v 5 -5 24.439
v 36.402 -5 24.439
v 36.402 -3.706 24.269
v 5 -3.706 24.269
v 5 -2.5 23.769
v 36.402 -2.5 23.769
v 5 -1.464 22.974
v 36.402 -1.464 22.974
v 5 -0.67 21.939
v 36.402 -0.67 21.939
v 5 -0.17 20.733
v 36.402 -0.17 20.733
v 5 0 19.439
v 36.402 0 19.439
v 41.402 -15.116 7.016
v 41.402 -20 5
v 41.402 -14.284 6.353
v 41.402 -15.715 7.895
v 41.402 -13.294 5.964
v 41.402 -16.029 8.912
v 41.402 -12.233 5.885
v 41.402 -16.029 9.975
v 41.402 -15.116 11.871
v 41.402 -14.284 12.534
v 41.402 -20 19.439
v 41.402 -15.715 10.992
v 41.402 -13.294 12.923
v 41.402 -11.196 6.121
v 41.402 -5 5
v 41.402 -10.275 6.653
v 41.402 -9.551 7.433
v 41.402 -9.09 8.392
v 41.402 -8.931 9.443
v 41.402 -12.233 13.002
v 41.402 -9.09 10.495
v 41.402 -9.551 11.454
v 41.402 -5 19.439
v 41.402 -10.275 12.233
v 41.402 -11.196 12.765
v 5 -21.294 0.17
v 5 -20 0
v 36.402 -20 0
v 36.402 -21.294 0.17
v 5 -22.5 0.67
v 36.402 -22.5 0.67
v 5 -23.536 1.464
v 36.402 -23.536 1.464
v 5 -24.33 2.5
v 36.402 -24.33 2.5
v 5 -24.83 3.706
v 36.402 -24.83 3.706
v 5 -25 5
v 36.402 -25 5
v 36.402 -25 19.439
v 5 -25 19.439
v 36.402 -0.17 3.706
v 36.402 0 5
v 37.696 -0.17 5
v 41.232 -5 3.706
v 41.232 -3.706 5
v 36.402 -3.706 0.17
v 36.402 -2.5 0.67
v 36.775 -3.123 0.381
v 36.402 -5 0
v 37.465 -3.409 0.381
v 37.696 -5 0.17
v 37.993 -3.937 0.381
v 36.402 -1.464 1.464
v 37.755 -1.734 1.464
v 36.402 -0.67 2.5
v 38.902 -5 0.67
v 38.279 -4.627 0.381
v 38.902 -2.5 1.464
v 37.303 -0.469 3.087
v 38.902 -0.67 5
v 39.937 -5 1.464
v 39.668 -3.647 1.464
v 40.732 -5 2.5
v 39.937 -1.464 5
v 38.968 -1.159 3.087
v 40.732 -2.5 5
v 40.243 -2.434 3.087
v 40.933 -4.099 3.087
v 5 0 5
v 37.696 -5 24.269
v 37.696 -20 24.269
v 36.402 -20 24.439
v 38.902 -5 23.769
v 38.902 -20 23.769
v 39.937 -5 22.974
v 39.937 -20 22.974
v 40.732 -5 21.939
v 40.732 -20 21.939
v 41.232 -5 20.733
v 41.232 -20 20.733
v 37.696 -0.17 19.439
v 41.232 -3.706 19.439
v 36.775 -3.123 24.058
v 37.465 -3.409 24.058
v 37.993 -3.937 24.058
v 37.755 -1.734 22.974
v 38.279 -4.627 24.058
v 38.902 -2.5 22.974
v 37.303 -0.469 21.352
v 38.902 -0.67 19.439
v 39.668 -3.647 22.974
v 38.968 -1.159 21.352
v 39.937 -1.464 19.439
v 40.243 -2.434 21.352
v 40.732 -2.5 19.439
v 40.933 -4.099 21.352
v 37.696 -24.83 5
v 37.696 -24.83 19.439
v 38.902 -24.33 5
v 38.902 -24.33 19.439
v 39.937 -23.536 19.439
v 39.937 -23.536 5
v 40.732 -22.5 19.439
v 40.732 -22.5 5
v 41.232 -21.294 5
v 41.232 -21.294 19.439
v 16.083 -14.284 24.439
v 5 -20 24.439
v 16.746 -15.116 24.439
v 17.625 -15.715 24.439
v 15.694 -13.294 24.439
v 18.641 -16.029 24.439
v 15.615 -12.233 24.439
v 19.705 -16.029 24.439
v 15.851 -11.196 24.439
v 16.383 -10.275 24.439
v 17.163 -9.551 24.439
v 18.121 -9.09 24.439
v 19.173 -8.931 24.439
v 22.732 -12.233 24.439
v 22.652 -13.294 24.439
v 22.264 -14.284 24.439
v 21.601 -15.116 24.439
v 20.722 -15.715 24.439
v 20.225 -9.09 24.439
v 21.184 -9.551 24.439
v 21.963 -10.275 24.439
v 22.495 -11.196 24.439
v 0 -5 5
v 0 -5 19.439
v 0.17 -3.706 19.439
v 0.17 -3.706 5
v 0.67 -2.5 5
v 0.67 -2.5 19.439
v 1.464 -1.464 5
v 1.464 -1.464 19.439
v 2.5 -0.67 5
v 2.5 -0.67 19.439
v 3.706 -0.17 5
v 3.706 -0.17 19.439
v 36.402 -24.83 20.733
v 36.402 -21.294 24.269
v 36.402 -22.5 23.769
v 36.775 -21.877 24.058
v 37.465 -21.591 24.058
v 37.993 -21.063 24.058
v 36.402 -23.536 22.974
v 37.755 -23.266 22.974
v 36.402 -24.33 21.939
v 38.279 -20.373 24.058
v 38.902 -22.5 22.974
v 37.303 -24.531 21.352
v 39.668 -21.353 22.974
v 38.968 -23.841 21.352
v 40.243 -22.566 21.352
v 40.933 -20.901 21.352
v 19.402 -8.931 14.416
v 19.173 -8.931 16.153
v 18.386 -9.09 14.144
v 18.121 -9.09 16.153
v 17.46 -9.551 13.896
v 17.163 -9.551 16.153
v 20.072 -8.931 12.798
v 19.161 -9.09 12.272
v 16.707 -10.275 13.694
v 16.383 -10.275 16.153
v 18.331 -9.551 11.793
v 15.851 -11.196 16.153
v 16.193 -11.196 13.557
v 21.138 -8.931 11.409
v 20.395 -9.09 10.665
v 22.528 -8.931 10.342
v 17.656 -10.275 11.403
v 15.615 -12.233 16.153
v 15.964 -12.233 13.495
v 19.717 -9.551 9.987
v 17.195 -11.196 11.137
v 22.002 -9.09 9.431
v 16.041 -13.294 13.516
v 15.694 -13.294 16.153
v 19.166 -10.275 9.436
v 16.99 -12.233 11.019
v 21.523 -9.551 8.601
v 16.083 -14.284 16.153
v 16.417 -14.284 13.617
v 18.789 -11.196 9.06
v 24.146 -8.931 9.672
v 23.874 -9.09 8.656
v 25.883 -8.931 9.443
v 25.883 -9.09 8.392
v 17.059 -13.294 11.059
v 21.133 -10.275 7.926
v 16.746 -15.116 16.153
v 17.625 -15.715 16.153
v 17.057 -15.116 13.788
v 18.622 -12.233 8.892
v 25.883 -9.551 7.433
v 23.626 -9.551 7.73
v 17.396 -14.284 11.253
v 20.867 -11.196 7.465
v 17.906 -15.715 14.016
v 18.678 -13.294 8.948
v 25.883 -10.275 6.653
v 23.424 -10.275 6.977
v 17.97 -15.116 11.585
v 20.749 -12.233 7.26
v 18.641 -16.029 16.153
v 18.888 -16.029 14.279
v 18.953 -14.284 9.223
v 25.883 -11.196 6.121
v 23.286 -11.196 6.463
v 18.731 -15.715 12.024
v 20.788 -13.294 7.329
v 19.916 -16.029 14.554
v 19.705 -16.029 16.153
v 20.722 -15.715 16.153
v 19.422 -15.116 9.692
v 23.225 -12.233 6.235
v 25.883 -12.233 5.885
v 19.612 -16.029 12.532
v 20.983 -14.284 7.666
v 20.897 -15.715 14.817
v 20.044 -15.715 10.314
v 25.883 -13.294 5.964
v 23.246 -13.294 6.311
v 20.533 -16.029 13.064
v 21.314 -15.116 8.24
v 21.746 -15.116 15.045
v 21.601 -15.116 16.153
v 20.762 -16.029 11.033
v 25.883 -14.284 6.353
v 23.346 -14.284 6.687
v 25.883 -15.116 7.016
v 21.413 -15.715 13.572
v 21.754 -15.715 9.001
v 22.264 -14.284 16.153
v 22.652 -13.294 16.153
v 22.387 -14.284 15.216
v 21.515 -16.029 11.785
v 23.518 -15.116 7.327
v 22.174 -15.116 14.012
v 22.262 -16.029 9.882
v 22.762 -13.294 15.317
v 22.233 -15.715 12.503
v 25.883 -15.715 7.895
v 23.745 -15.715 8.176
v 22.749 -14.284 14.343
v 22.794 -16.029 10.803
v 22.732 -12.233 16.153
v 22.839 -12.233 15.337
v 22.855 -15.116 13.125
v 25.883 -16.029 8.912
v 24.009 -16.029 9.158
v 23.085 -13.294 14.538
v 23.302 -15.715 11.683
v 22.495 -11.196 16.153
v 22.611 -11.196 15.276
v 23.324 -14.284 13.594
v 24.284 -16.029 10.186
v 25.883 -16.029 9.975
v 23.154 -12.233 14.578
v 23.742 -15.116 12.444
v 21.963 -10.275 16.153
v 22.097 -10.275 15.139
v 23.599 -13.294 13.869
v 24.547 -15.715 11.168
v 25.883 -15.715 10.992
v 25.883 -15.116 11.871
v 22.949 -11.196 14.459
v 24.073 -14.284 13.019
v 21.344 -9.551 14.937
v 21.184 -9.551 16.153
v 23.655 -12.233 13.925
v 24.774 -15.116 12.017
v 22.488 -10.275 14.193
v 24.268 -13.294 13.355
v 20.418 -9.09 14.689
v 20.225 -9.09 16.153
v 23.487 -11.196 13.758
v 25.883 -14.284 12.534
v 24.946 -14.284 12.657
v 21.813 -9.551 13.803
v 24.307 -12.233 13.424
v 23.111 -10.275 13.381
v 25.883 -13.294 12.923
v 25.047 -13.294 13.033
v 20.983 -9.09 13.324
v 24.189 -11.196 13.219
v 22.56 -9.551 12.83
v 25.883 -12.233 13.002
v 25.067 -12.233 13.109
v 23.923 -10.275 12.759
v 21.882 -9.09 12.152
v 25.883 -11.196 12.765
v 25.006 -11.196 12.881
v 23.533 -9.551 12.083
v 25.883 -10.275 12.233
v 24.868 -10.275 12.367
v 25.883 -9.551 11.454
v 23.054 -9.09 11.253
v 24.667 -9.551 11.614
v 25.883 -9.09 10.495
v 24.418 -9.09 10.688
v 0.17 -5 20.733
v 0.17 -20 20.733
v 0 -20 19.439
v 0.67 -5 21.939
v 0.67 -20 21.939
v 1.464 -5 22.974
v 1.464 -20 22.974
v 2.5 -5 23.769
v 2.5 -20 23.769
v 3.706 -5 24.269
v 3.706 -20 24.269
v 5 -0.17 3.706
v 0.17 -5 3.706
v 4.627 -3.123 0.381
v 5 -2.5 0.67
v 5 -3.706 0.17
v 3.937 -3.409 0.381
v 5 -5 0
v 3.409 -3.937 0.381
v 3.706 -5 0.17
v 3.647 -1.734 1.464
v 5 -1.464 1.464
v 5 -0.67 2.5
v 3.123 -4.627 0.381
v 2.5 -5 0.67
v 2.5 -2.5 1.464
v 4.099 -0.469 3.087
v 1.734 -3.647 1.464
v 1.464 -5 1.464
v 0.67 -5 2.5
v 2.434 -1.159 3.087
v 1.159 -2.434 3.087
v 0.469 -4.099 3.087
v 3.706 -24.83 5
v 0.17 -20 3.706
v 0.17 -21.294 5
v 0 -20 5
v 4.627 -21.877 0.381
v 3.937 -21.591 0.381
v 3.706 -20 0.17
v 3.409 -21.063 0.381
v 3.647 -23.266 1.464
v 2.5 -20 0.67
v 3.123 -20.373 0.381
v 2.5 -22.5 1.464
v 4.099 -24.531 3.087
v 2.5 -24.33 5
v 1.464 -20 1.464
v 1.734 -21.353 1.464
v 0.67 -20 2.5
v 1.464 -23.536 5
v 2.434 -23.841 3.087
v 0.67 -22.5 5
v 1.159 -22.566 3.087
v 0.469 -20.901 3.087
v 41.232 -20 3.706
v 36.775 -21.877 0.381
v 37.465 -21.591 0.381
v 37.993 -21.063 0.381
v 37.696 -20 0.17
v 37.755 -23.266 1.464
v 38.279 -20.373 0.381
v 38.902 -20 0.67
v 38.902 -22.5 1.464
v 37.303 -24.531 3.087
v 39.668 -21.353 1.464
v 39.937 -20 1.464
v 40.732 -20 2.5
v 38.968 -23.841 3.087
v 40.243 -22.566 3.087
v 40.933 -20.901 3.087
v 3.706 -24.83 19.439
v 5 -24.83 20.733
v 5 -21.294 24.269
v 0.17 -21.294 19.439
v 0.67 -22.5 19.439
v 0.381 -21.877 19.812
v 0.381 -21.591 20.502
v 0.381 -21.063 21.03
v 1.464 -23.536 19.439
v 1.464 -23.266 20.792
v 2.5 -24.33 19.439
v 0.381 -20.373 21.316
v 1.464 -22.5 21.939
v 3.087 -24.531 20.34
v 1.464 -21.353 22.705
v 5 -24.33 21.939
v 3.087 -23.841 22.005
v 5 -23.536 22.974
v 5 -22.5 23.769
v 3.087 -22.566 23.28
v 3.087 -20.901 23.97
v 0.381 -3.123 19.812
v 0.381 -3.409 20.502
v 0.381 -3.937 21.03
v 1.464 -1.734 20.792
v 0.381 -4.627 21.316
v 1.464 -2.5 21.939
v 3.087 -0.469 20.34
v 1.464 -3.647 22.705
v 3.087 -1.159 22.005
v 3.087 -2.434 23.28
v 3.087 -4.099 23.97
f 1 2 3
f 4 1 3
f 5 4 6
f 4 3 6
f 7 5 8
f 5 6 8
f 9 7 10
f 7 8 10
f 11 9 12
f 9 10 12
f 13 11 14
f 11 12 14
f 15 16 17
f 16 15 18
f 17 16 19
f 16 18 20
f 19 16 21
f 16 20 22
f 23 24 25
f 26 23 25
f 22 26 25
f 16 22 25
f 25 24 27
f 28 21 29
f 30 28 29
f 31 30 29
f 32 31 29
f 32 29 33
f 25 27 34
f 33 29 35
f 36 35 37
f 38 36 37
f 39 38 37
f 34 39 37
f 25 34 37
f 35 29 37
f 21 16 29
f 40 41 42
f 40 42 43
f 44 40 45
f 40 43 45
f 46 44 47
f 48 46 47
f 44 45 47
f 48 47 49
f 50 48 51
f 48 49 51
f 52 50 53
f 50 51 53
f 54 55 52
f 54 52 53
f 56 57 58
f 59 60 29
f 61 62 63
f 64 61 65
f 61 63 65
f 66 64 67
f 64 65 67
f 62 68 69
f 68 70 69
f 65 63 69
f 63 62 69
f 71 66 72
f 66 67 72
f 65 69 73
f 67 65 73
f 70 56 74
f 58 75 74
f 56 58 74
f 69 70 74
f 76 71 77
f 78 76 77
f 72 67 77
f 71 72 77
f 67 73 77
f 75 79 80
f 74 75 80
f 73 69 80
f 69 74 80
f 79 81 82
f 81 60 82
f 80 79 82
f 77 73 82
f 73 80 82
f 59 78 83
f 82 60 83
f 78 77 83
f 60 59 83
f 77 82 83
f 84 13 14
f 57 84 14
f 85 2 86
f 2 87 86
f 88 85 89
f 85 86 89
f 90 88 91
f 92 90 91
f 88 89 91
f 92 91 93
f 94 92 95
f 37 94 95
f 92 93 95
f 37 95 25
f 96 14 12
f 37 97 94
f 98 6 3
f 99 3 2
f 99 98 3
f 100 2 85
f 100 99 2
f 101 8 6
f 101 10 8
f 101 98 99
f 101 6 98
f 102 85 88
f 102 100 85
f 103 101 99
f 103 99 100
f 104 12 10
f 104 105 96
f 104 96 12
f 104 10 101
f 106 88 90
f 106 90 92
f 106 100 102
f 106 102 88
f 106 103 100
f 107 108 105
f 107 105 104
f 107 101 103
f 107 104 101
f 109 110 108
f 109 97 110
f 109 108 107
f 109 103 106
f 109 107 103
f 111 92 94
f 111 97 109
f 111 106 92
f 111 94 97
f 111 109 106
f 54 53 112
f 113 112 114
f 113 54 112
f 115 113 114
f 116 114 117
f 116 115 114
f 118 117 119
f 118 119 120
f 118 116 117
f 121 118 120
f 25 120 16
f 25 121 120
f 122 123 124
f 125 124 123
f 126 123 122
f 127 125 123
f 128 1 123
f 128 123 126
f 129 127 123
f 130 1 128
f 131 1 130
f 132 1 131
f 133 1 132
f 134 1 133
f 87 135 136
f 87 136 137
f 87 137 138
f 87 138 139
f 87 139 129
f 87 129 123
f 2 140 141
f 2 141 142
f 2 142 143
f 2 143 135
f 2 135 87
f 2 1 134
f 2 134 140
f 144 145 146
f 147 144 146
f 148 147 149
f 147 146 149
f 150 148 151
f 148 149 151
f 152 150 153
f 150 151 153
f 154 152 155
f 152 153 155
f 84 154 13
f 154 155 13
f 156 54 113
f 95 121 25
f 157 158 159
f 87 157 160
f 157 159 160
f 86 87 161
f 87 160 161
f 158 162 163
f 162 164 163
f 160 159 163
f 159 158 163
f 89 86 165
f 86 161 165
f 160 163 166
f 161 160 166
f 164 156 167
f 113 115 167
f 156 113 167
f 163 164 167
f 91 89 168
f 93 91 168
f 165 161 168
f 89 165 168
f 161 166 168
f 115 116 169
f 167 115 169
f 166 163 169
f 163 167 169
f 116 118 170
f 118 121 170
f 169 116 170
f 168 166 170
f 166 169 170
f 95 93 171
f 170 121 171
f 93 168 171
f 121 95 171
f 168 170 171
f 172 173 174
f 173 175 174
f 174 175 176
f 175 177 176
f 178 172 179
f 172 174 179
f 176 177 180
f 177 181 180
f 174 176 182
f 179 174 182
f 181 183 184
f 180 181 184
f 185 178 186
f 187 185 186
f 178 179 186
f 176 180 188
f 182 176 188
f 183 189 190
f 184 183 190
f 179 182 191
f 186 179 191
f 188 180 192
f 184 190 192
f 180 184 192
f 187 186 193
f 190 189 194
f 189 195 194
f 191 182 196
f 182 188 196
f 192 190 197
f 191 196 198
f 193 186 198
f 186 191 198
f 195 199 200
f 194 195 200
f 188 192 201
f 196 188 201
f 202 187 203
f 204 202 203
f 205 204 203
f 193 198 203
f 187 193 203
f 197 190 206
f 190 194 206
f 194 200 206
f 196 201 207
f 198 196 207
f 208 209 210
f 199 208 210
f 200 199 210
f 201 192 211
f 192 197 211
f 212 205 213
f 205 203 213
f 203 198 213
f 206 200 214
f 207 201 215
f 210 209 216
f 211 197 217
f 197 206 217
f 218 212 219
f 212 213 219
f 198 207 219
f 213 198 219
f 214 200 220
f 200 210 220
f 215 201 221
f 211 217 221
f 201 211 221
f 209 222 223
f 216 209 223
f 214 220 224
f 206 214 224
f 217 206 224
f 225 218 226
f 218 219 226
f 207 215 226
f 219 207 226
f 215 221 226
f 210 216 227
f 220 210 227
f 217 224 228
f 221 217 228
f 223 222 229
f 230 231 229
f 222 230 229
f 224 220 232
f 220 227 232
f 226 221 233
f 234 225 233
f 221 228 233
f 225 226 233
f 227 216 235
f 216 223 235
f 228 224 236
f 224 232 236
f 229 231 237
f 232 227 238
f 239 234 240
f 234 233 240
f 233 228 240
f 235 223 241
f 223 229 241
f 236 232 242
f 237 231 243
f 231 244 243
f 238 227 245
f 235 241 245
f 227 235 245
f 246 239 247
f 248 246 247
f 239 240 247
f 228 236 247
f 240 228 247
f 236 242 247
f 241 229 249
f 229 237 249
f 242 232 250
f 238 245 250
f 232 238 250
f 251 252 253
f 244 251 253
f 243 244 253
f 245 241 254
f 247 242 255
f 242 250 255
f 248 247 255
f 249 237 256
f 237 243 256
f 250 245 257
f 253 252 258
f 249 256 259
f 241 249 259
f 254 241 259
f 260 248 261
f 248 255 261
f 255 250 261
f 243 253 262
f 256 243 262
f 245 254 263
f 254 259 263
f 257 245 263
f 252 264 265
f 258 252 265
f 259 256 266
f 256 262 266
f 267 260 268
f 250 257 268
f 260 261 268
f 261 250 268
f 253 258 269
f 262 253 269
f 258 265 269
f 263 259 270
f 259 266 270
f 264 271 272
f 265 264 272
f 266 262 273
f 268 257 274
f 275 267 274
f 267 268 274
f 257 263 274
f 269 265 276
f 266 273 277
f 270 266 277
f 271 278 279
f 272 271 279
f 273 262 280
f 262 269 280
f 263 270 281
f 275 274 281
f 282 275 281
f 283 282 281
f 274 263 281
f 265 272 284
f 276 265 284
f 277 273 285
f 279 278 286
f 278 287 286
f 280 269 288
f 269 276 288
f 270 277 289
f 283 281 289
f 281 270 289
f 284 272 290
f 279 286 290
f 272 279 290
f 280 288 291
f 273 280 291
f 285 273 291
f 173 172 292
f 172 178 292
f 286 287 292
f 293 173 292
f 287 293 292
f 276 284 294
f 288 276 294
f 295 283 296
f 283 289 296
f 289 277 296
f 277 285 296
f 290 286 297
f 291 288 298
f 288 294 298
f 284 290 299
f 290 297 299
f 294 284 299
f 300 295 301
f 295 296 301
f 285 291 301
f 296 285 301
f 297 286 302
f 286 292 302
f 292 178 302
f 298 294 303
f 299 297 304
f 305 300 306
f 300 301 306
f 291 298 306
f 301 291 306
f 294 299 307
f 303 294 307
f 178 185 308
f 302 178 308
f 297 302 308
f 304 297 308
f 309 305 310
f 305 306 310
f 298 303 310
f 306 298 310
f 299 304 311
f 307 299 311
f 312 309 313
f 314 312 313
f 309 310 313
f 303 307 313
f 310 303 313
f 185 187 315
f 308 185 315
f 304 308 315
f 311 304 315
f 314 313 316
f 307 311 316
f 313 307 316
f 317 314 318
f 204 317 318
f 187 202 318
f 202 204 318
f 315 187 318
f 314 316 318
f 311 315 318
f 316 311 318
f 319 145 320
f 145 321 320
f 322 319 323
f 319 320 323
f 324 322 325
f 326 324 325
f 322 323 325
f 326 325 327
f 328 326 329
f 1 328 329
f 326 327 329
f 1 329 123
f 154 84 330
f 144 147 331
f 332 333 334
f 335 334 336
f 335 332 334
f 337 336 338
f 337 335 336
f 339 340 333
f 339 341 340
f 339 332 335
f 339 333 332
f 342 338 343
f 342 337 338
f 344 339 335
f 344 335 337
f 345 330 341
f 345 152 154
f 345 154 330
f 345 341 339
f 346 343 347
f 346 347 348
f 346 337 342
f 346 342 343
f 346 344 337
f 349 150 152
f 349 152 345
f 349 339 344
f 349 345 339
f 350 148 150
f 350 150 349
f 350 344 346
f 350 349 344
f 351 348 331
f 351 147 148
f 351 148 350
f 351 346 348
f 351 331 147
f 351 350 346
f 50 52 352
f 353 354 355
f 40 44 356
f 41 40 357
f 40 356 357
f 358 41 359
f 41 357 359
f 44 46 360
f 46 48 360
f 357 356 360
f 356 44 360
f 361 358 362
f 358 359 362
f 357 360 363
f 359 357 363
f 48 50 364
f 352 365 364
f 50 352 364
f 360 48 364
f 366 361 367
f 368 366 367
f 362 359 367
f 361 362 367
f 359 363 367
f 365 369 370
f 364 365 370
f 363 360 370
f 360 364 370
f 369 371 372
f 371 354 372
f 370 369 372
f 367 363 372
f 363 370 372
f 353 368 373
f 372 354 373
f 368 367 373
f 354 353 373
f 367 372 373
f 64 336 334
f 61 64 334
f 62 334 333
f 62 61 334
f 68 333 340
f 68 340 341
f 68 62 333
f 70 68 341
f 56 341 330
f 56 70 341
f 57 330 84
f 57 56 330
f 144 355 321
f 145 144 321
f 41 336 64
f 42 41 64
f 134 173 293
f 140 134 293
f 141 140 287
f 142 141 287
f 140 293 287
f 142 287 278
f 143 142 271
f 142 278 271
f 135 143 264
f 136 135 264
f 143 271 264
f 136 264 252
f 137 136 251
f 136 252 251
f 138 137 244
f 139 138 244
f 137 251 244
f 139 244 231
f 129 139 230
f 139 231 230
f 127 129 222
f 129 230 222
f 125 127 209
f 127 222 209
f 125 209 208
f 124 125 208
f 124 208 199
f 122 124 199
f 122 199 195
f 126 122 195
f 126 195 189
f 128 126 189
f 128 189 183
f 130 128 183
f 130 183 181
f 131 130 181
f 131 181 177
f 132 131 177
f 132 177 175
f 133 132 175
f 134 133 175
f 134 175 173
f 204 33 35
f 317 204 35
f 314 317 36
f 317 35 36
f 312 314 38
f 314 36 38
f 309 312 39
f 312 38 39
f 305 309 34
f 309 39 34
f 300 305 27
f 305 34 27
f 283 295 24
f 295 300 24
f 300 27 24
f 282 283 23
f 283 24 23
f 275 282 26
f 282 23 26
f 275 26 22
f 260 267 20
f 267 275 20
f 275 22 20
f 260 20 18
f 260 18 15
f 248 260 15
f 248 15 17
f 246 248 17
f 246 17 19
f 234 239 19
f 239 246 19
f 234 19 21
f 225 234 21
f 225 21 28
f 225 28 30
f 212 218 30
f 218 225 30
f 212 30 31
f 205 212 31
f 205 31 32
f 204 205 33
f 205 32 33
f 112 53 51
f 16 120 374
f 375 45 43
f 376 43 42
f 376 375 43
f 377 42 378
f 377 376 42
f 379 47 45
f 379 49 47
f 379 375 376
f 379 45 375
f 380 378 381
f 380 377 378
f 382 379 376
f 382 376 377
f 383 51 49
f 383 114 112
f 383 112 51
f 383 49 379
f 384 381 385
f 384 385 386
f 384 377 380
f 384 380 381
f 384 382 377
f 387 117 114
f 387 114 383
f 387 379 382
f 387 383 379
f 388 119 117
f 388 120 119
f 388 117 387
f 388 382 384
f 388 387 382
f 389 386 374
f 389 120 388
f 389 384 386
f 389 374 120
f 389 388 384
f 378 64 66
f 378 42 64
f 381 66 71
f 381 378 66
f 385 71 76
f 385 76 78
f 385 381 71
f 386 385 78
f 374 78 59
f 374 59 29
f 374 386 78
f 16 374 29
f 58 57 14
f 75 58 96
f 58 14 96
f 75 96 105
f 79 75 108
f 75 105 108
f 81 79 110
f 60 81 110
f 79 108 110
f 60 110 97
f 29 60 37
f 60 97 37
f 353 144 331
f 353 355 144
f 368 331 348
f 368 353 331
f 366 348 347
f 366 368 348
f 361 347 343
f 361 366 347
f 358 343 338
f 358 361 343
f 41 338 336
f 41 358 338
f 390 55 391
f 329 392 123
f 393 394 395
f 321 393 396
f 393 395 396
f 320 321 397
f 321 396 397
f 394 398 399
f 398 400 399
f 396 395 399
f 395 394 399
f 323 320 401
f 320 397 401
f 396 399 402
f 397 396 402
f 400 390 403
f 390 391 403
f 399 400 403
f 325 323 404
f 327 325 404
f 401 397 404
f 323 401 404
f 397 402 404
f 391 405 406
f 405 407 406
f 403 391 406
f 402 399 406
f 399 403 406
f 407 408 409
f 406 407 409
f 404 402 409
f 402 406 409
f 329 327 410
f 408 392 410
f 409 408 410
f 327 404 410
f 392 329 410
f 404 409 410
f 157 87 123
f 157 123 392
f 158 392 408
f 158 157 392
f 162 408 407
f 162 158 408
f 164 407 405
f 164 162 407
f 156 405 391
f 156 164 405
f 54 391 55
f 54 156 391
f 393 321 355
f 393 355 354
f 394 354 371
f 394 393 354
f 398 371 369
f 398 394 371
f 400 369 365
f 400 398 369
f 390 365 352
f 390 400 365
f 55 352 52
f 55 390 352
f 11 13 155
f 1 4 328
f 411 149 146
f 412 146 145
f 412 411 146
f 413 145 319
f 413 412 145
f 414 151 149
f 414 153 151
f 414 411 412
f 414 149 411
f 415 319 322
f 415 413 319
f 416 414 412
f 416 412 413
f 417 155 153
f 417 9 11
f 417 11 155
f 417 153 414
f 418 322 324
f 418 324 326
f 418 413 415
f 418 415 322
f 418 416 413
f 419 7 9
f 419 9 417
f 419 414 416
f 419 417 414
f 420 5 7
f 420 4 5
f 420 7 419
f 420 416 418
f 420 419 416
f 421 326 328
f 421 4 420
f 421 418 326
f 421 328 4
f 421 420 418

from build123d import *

# Parameters (mm, degrees)
F0_W     = 41.4018779993
F0_H     = 24.4389437139
F1_DEPTH = 25
F4_R     = 3.5686331082
F6_R     = 5


with BuildPart() as f1:
    # F0 (on Front) → F1 (new body)
    with BuildSketch(Plane.XZ):
        with Locations((20.7009389997, 12.219471857)):
            Rectangle(F0_W, F0_H)
    extrude(amount=F1_DEPTH)

    # F5: sweep along a path in F3
    with BuildLine(Plane.XZ.offset(12.5)) as f5_path:
        Line((19.1687617356, 24.4389437139), (19.1687617356, 16.1529793682))
        ThreePointArc((19.1687617356, 16.1529793682), (21.1352572497, 11.4054392279), (25.88279739, 9.4389437139))
        Line((25.88279739, 9.4389437139), (41.4018779993, 9.4389437139))
    # F4 (on face) → F5 (sweep, cut)
    with BuildSketch(Plane.YZ.offset(41.4018779993)):
        with Locations((-12.5, 9.4434265047)):
            Circle(F4_R)
    sweep(path=f5_path.line, mode=Mode.SUBTRACT)

    # F6
    f6_edges = [f1.edges().sort_by_distance(p)[0] for p in [
        (41.401878, 0, 12.219472),
        (20.700939, 0, 24.438944),
        (0, 0, 12.219472),
        (20.700939, 0, 0),
        (41.401878, -25, 12.219472),
        (20.700939, -25, 24.438944),
        (0, -25, 12.219472),
        (20.700939, -25, 0),
        (41.401878, -12.5, 0),
        (0, -12.5, 0),
        (41.401878, -12.5, 24.438944),
        (0, -12.5, 24.438944),
    ]]
    fillet(f6_edges, radius=F6_R)


solid = f1.part
